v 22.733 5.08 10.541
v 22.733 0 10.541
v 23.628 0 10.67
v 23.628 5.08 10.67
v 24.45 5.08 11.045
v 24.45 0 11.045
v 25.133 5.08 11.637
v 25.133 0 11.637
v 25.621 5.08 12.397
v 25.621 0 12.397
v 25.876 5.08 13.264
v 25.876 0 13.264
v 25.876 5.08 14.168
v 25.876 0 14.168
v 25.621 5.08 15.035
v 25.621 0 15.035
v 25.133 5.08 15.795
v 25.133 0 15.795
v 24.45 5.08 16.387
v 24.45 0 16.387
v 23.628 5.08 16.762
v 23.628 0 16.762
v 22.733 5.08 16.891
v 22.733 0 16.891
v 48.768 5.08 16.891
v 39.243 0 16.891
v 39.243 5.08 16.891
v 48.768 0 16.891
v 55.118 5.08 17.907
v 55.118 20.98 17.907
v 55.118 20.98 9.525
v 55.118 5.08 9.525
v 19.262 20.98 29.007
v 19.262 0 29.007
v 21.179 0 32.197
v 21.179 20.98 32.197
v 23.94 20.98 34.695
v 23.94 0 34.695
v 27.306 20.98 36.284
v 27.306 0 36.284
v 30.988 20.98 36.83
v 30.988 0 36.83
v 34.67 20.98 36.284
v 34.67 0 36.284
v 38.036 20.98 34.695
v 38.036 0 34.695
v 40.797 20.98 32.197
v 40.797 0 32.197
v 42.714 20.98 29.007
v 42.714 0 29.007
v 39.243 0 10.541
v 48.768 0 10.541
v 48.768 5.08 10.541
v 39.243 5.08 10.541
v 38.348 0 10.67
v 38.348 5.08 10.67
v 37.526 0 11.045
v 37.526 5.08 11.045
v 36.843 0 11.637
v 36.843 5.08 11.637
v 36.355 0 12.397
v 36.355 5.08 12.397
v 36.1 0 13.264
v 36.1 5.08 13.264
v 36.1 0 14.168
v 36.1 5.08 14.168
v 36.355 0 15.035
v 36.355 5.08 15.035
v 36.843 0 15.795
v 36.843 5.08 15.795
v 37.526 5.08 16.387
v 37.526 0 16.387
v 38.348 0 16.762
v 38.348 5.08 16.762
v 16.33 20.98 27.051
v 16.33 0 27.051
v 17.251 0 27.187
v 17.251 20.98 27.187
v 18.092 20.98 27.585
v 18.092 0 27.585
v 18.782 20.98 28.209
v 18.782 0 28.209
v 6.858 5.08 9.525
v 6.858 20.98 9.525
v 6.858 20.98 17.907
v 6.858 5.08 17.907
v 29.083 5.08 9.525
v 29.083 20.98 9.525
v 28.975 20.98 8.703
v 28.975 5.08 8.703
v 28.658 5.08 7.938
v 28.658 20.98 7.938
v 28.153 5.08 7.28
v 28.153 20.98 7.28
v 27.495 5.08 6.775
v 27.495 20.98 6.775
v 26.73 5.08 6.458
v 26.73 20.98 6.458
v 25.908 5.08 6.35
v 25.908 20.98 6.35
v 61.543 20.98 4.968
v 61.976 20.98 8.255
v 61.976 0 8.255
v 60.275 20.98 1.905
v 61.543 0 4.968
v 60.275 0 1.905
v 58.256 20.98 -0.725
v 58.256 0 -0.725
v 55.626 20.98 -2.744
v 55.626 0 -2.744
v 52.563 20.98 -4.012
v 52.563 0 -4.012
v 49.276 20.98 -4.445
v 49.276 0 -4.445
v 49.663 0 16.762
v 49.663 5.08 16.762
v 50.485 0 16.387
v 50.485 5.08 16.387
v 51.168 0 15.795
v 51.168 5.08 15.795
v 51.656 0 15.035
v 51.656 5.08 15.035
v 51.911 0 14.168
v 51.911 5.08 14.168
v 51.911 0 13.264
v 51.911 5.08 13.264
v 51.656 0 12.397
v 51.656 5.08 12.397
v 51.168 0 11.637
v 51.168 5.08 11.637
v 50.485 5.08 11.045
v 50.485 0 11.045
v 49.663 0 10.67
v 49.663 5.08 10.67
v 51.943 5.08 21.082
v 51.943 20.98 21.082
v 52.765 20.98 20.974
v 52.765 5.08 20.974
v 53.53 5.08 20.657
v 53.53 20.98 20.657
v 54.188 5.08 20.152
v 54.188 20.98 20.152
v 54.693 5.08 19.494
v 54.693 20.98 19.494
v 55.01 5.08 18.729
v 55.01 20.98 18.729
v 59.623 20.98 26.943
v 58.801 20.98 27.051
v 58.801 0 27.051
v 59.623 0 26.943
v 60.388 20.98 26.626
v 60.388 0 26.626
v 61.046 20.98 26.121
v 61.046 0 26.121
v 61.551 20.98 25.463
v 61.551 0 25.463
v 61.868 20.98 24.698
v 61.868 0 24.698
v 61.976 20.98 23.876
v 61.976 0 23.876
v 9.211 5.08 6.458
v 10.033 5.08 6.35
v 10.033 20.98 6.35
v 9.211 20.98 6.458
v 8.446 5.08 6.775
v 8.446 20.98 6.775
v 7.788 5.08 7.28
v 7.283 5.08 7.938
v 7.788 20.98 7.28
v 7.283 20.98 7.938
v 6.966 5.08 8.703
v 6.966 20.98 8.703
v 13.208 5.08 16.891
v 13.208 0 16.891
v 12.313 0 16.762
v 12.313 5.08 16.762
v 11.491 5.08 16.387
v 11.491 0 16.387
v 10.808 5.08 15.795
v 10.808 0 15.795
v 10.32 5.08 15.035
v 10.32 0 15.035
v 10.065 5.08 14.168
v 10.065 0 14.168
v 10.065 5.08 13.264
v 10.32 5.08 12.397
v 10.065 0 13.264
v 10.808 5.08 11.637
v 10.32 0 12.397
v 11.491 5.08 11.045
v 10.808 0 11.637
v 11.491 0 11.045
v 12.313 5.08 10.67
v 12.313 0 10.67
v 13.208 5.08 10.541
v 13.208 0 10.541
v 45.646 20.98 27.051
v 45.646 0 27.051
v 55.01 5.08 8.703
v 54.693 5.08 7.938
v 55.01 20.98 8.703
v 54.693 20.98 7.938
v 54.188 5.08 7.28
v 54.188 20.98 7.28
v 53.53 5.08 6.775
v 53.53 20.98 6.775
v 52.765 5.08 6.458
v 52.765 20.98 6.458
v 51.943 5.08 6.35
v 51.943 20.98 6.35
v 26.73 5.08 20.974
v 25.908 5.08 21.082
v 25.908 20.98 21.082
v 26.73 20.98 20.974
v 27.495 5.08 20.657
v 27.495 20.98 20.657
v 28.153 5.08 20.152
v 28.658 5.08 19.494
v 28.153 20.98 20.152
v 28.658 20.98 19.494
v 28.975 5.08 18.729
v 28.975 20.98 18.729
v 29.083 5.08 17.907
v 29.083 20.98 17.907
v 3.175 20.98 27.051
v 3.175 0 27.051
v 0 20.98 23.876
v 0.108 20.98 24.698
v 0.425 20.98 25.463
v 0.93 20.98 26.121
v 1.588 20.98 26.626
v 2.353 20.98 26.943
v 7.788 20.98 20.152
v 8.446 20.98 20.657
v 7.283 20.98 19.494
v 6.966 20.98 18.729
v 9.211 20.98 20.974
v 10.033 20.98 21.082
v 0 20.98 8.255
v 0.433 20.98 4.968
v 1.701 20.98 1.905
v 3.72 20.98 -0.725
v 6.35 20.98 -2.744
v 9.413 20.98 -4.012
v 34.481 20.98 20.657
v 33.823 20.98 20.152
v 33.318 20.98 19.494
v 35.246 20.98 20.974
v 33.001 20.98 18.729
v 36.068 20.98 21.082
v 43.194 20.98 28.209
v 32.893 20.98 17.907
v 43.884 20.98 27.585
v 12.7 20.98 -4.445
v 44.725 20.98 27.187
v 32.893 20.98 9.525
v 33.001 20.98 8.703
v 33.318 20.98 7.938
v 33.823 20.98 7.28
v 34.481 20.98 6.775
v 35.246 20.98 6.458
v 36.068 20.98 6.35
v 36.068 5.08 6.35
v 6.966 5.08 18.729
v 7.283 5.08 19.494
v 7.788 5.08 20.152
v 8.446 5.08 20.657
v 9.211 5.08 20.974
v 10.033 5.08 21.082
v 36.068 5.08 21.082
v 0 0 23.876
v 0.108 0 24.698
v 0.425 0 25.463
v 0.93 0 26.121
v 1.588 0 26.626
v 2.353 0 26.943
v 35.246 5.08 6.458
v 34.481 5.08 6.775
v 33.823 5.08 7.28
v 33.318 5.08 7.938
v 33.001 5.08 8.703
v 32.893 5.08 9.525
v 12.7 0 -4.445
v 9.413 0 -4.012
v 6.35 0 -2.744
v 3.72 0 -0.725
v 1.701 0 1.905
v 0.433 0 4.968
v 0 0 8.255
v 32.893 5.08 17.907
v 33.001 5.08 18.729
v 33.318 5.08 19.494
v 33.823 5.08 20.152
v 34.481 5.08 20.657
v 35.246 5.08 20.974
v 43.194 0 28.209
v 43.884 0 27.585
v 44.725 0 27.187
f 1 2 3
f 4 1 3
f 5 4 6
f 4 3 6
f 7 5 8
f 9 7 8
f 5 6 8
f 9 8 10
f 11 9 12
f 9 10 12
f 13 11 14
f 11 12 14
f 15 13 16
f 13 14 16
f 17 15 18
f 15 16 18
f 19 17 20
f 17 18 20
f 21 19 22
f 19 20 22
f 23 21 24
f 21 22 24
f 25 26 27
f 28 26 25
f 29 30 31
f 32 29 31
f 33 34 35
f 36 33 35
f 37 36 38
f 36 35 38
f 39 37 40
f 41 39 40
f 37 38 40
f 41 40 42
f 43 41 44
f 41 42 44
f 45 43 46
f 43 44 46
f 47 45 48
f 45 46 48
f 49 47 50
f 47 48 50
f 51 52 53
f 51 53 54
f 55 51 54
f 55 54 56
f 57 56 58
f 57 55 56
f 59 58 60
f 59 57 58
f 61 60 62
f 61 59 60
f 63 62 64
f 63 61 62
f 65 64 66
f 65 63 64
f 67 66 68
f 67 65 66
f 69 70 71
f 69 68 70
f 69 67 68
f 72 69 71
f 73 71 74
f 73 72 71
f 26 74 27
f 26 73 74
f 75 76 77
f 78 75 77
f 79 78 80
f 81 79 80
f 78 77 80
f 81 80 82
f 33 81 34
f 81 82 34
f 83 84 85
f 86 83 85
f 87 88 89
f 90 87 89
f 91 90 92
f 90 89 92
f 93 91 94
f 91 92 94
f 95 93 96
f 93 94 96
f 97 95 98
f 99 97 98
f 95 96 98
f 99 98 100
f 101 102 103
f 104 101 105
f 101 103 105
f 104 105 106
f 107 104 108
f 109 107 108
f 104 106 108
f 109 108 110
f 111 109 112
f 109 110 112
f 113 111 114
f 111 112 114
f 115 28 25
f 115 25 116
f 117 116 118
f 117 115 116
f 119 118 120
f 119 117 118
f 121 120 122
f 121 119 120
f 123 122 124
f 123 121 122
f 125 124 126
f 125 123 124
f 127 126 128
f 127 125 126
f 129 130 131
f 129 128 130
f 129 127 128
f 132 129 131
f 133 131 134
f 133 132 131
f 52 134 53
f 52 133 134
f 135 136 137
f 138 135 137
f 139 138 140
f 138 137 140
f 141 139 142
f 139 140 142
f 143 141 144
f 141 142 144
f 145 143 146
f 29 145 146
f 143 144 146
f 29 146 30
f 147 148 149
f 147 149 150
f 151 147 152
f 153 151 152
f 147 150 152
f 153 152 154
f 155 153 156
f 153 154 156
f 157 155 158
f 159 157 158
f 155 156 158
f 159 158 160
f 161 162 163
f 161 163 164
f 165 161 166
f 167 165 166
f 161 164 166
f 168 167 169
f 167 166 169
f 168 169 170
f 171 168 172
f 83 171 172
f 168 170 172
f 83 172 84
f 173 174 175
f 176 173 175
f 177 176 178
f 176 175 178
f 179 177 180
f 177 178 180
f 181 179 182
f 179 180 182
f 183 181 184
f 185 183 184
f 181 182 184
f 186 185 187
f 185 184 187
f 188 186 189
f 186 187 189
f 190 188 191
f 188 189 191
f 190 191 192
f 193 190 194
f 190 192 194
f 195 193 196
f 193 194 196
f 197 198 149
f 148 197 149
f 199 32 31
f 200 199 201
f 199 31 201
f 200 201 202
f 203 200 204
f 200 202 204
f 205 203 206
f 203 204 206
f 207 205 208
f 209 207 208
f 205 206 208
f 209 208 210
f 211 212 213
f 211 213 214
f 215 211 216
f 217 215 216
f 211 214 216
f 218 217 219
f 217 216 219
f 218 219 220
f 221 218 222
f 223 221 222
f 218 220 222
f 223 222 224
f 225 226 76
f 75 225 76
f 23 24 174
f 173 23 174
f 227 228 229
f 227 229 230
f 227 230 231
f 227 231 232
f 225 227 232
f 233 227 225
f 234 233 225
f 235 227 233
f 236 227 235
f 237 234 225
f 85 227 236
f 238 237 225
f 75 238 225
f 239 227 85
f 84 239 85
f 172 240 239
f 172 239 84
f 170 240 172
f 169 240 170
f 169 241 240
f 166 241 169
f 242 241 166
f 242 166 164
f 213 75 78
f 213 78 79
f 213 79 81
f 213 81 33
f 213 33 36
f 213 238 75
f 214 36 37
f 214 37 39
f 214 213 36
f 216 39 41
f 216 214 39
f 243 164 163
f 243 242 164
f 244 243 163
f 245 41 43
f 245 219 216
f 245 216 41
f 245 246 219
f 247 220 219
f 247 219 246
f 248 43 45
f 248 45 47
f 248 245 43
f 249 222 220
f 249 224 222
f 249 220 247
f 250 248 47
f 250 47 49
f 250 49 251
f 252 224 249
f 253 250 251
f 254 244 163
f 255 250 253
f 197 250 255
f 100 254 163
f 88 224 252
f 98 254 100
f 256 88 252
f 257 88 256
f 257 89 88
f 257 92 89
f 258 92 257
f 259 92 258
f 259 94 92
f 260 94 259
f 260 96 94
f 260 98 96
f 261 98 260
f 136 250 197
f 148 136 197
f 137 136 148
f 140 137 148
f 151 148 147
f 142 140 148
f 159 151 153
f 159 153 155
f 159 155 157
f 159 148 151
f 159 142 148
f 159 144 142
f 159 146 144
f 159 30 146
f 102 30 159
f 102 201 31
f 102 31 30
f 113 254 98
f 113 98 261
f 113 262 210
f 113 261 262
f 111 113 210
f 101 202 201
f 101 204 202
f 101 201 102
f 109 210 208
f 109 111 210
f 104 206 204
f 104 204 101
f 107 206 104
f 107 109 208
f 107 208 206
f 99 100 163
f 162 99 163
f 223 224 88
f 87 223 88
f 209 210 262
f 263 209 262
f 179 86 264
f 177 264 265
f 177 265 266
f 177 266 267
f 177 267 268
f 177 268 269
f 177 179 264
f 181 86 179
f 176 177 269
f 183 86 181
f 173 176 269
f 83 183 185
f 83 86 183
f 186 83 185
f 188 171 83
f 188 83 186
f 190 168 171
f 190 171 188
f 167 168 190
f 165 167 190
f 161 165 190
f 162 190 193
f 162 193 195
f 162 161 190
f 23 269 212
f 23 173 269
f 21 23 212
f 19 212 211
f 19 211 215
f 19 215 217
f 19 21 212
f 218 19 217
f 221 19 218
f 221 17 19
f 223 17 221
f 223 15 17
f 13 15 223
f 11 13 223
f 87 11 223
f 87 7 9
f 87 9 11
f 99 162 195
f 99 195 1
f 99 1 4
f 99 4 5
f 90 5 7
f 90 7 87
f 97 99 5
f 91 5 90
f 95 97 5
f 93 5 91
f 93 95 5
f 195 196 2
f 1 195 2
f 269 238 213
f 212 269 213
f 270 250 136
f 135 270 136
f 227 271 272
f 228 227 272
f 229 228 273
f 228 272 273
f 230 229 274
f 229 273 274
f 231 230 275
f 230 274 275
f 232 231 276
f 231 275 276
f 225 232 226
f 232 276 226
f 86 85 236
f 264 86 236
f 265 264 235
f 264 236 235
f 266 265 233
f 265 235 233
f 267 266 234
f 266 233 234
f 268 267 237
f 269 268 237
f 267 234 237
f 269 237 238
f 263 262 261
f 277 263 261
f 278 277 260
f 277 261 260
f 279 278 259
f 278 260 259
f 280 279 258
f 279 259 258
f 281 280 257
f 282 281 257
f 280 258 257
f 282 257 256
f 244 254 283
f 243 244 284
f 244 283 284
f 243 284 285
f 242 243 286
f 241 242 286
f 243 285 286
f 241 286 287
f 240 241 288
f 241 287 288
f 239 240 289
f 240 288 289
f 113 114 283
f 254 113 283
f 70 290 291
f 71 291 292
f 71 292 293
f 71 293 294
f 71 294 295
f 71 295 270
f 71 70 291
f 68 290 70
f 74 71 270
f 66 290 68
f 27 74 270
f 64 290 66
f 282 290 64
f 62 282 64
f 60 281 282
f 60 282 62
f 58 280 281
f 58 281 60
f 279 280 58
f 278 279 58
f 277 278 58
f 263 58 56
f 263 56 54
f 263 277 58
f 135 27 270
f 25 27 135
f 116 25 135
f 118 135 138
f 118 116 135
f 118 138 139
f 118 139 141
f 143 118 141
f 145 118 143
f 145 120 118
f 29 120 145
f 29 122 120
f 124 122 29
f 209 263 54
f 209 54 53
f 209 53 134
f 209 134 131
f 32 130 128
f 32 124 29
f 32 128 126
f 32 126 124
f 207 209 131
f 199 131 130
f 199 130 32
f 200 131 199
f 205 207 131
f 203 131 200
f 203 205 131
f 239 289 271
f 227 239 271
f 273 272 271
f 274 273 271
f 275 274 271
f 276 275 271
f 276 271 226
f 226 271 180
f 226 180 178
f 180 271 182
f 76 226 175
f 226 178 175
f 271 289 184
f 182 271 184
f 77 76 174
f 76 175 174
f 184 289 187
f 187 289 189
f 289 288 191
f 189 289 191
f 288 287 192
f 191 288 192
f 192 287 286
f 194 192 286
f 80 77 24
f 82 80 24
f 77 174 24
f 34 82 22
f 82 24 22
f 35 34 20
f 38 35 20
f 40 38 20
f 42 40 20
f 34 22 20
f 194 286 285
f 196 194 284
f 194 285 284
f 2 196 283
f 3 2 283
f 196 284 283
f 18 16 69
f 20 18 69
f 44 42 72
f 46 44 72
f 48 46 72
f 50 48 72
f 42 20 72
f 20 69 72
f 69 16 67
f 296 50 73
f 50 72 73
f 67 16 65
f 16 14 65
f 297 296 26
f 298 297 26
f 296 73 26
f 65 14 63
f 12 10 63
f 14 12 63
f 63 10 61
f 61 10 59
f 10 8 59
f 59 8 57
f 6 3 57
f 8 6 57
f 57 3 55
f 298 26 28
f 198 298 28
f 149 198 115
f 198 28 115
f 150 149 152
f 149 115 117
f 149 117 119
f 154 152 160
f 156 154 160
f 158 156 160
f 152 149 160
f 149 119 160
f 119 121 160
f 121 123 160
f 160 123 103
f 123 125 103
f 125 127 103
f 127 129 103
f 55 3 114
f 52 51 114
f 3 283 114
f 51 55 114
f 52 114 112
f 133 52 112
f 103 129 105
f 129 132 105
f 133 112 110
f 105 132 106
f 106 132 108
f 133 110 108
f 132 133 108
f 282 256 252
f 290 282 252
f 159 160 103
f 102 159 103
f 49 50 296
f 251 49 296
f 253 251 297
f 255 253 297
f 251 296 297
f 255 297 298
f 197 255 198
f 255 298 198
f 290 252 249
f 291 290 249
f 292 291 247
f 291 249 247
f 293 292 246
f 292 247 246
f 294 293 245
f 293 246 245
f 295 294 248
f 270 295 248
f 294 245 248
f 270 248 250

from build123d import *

# Parameters (mm, degrees)
BOSS_EXTRUDE1_DEPTH = 20.9804
CUT_EXTRUDE1_DEPTH  = 15.9004


with BuildPart() as part:
    # Sketch1 → Boss-Extrude1 (new body)
    with BuildSketch(Plane(origin=(0, 0, 0), x_dir=(1, 0, 0), z_dir=(0, 1, 0))):
        with BuildLine():
            Line((0, -8.255), (0, -23.876))
            ThreePointArc((0, -23.876), (0.92993597, -26.12106403), (3.175, -27.051))
            Line((3.175, -27.051), (16.330087154, -27.051))
            ThreePointArc((16.330087154, -27.051), (18.092140644, -27.584827438), (19.261669723, -29.0068))
            ThreePointArc((19.261669723, -29.0068), (30.988, -36.83), (42.714330277, -29.0068))
            ThreePointArc((42.714330277, -29.0068), (43.883859356, -27.584827438), (45.645912846, -27.051))
            Line((45.645912846, -27.051), (58.801, -27.051))
            ThreePointArc((58.801, -27.051), (61.04606403, -26.12106403), (61.976, -23.876))
            Line((61.976, -23.876), (61.976, -8.255))
            ThreePointArc((61.976, -8.255), (58.256256121, 0.725256121), (49.276, 4.445))
            Line((49.276, 4.445), (12.7, 4.445))
            ThreePointArc((12.7, 4.445), (3.719743879, 0.725256121), (0, -8.255))
        make_face()
        with BuildLine():
            Line((13.208, -10.541), (22.733, -10.541))
            ThreePointArc((22.733, -10.541), (25.908, -13.716), (22.733, -16.891))
            Line((22.733, -16.891), (13.208, -16.891))
            ThreePointArc((13.208, -16.891), (10.033, -13.716), (13.208, -10.541))
        make_face(mode=Mode.SUBTRACT)
        with BuildLine():
            Line((48.768, -10.541), (39.243, -10.541))
            ThreePointArc((39.243, -10.541), (36.068, -13.716), (39.243, -16.891))
            Line((39.243, -16.891), (48.768, -16.891))
            ThreePointArc((48.768, -16.891), (51.943, -13.716), (48.768, -10.541))
        make_face(mode=Mode.SUBTRACT)
    extrude(amount=BOSS_EXTRUDE1_DEPTH)

    # Sketch2 → Cut-Extrude1 (cut)
    with BuildSketch(Plane(origin=(0, 20.9804, 0), x_dir=(1, 0, 0), z_dir=(0, 1, 0))):
        with BuildLine():
            Line((6.858, -9.525), (6.858, -17.907))
            ThreePointArc((6.858, -17.907), (7.78793597, -20.15206403), (10.033, -21.082))
            Line((10.033, -21.082), (25.908, -21.082))
            ThreePointArc((25.908, -21.082), (28.15306403, -20.15206403), (29.083, -17.907))
            Line((29.083, -17.907), (29.083, -9.525))
            ThreePointArc((29.083, -9.525), (28.15306403, -7.27993597), (25.908, -6.35))
            Line((25.908, -6.35), (10.033, -6.35))
            ThreePointArc((10.033, -6.35), (7.78793597, -7.27993597), (6.858, -9.525))
        make_face()
        with BuildLine():
            Line((51.943, -6.35), (36.068, -6.35))
            ThreePointArc((36.068, -6.35), (33.82293597, -7.27993597), (32.893, -9.525))
            Line((32.893, -9.525), (32.893, -17.907))
            ThreePointArc((32.893, -17.907), (33.82293597, -20.15206403), (36.068, -21.082))
            Line((36.068, -21.082), (51.943, -21.082))
            ThreePointArc((51.943, -21.082), (54.18806403, -20.15206403), (55.118, -17.907))
            Line((55.118, -17.907), (55.118, -9.525))
            ThreePointArc((55.118, -9.525), (54.18806403, -7.27993597), (51.943, -6.35))
        make_face()
    extrude(amount=-CUT_EXTRUDE1_DEPTH, mode=Mode.SUBTRACT)


solid = part.part
